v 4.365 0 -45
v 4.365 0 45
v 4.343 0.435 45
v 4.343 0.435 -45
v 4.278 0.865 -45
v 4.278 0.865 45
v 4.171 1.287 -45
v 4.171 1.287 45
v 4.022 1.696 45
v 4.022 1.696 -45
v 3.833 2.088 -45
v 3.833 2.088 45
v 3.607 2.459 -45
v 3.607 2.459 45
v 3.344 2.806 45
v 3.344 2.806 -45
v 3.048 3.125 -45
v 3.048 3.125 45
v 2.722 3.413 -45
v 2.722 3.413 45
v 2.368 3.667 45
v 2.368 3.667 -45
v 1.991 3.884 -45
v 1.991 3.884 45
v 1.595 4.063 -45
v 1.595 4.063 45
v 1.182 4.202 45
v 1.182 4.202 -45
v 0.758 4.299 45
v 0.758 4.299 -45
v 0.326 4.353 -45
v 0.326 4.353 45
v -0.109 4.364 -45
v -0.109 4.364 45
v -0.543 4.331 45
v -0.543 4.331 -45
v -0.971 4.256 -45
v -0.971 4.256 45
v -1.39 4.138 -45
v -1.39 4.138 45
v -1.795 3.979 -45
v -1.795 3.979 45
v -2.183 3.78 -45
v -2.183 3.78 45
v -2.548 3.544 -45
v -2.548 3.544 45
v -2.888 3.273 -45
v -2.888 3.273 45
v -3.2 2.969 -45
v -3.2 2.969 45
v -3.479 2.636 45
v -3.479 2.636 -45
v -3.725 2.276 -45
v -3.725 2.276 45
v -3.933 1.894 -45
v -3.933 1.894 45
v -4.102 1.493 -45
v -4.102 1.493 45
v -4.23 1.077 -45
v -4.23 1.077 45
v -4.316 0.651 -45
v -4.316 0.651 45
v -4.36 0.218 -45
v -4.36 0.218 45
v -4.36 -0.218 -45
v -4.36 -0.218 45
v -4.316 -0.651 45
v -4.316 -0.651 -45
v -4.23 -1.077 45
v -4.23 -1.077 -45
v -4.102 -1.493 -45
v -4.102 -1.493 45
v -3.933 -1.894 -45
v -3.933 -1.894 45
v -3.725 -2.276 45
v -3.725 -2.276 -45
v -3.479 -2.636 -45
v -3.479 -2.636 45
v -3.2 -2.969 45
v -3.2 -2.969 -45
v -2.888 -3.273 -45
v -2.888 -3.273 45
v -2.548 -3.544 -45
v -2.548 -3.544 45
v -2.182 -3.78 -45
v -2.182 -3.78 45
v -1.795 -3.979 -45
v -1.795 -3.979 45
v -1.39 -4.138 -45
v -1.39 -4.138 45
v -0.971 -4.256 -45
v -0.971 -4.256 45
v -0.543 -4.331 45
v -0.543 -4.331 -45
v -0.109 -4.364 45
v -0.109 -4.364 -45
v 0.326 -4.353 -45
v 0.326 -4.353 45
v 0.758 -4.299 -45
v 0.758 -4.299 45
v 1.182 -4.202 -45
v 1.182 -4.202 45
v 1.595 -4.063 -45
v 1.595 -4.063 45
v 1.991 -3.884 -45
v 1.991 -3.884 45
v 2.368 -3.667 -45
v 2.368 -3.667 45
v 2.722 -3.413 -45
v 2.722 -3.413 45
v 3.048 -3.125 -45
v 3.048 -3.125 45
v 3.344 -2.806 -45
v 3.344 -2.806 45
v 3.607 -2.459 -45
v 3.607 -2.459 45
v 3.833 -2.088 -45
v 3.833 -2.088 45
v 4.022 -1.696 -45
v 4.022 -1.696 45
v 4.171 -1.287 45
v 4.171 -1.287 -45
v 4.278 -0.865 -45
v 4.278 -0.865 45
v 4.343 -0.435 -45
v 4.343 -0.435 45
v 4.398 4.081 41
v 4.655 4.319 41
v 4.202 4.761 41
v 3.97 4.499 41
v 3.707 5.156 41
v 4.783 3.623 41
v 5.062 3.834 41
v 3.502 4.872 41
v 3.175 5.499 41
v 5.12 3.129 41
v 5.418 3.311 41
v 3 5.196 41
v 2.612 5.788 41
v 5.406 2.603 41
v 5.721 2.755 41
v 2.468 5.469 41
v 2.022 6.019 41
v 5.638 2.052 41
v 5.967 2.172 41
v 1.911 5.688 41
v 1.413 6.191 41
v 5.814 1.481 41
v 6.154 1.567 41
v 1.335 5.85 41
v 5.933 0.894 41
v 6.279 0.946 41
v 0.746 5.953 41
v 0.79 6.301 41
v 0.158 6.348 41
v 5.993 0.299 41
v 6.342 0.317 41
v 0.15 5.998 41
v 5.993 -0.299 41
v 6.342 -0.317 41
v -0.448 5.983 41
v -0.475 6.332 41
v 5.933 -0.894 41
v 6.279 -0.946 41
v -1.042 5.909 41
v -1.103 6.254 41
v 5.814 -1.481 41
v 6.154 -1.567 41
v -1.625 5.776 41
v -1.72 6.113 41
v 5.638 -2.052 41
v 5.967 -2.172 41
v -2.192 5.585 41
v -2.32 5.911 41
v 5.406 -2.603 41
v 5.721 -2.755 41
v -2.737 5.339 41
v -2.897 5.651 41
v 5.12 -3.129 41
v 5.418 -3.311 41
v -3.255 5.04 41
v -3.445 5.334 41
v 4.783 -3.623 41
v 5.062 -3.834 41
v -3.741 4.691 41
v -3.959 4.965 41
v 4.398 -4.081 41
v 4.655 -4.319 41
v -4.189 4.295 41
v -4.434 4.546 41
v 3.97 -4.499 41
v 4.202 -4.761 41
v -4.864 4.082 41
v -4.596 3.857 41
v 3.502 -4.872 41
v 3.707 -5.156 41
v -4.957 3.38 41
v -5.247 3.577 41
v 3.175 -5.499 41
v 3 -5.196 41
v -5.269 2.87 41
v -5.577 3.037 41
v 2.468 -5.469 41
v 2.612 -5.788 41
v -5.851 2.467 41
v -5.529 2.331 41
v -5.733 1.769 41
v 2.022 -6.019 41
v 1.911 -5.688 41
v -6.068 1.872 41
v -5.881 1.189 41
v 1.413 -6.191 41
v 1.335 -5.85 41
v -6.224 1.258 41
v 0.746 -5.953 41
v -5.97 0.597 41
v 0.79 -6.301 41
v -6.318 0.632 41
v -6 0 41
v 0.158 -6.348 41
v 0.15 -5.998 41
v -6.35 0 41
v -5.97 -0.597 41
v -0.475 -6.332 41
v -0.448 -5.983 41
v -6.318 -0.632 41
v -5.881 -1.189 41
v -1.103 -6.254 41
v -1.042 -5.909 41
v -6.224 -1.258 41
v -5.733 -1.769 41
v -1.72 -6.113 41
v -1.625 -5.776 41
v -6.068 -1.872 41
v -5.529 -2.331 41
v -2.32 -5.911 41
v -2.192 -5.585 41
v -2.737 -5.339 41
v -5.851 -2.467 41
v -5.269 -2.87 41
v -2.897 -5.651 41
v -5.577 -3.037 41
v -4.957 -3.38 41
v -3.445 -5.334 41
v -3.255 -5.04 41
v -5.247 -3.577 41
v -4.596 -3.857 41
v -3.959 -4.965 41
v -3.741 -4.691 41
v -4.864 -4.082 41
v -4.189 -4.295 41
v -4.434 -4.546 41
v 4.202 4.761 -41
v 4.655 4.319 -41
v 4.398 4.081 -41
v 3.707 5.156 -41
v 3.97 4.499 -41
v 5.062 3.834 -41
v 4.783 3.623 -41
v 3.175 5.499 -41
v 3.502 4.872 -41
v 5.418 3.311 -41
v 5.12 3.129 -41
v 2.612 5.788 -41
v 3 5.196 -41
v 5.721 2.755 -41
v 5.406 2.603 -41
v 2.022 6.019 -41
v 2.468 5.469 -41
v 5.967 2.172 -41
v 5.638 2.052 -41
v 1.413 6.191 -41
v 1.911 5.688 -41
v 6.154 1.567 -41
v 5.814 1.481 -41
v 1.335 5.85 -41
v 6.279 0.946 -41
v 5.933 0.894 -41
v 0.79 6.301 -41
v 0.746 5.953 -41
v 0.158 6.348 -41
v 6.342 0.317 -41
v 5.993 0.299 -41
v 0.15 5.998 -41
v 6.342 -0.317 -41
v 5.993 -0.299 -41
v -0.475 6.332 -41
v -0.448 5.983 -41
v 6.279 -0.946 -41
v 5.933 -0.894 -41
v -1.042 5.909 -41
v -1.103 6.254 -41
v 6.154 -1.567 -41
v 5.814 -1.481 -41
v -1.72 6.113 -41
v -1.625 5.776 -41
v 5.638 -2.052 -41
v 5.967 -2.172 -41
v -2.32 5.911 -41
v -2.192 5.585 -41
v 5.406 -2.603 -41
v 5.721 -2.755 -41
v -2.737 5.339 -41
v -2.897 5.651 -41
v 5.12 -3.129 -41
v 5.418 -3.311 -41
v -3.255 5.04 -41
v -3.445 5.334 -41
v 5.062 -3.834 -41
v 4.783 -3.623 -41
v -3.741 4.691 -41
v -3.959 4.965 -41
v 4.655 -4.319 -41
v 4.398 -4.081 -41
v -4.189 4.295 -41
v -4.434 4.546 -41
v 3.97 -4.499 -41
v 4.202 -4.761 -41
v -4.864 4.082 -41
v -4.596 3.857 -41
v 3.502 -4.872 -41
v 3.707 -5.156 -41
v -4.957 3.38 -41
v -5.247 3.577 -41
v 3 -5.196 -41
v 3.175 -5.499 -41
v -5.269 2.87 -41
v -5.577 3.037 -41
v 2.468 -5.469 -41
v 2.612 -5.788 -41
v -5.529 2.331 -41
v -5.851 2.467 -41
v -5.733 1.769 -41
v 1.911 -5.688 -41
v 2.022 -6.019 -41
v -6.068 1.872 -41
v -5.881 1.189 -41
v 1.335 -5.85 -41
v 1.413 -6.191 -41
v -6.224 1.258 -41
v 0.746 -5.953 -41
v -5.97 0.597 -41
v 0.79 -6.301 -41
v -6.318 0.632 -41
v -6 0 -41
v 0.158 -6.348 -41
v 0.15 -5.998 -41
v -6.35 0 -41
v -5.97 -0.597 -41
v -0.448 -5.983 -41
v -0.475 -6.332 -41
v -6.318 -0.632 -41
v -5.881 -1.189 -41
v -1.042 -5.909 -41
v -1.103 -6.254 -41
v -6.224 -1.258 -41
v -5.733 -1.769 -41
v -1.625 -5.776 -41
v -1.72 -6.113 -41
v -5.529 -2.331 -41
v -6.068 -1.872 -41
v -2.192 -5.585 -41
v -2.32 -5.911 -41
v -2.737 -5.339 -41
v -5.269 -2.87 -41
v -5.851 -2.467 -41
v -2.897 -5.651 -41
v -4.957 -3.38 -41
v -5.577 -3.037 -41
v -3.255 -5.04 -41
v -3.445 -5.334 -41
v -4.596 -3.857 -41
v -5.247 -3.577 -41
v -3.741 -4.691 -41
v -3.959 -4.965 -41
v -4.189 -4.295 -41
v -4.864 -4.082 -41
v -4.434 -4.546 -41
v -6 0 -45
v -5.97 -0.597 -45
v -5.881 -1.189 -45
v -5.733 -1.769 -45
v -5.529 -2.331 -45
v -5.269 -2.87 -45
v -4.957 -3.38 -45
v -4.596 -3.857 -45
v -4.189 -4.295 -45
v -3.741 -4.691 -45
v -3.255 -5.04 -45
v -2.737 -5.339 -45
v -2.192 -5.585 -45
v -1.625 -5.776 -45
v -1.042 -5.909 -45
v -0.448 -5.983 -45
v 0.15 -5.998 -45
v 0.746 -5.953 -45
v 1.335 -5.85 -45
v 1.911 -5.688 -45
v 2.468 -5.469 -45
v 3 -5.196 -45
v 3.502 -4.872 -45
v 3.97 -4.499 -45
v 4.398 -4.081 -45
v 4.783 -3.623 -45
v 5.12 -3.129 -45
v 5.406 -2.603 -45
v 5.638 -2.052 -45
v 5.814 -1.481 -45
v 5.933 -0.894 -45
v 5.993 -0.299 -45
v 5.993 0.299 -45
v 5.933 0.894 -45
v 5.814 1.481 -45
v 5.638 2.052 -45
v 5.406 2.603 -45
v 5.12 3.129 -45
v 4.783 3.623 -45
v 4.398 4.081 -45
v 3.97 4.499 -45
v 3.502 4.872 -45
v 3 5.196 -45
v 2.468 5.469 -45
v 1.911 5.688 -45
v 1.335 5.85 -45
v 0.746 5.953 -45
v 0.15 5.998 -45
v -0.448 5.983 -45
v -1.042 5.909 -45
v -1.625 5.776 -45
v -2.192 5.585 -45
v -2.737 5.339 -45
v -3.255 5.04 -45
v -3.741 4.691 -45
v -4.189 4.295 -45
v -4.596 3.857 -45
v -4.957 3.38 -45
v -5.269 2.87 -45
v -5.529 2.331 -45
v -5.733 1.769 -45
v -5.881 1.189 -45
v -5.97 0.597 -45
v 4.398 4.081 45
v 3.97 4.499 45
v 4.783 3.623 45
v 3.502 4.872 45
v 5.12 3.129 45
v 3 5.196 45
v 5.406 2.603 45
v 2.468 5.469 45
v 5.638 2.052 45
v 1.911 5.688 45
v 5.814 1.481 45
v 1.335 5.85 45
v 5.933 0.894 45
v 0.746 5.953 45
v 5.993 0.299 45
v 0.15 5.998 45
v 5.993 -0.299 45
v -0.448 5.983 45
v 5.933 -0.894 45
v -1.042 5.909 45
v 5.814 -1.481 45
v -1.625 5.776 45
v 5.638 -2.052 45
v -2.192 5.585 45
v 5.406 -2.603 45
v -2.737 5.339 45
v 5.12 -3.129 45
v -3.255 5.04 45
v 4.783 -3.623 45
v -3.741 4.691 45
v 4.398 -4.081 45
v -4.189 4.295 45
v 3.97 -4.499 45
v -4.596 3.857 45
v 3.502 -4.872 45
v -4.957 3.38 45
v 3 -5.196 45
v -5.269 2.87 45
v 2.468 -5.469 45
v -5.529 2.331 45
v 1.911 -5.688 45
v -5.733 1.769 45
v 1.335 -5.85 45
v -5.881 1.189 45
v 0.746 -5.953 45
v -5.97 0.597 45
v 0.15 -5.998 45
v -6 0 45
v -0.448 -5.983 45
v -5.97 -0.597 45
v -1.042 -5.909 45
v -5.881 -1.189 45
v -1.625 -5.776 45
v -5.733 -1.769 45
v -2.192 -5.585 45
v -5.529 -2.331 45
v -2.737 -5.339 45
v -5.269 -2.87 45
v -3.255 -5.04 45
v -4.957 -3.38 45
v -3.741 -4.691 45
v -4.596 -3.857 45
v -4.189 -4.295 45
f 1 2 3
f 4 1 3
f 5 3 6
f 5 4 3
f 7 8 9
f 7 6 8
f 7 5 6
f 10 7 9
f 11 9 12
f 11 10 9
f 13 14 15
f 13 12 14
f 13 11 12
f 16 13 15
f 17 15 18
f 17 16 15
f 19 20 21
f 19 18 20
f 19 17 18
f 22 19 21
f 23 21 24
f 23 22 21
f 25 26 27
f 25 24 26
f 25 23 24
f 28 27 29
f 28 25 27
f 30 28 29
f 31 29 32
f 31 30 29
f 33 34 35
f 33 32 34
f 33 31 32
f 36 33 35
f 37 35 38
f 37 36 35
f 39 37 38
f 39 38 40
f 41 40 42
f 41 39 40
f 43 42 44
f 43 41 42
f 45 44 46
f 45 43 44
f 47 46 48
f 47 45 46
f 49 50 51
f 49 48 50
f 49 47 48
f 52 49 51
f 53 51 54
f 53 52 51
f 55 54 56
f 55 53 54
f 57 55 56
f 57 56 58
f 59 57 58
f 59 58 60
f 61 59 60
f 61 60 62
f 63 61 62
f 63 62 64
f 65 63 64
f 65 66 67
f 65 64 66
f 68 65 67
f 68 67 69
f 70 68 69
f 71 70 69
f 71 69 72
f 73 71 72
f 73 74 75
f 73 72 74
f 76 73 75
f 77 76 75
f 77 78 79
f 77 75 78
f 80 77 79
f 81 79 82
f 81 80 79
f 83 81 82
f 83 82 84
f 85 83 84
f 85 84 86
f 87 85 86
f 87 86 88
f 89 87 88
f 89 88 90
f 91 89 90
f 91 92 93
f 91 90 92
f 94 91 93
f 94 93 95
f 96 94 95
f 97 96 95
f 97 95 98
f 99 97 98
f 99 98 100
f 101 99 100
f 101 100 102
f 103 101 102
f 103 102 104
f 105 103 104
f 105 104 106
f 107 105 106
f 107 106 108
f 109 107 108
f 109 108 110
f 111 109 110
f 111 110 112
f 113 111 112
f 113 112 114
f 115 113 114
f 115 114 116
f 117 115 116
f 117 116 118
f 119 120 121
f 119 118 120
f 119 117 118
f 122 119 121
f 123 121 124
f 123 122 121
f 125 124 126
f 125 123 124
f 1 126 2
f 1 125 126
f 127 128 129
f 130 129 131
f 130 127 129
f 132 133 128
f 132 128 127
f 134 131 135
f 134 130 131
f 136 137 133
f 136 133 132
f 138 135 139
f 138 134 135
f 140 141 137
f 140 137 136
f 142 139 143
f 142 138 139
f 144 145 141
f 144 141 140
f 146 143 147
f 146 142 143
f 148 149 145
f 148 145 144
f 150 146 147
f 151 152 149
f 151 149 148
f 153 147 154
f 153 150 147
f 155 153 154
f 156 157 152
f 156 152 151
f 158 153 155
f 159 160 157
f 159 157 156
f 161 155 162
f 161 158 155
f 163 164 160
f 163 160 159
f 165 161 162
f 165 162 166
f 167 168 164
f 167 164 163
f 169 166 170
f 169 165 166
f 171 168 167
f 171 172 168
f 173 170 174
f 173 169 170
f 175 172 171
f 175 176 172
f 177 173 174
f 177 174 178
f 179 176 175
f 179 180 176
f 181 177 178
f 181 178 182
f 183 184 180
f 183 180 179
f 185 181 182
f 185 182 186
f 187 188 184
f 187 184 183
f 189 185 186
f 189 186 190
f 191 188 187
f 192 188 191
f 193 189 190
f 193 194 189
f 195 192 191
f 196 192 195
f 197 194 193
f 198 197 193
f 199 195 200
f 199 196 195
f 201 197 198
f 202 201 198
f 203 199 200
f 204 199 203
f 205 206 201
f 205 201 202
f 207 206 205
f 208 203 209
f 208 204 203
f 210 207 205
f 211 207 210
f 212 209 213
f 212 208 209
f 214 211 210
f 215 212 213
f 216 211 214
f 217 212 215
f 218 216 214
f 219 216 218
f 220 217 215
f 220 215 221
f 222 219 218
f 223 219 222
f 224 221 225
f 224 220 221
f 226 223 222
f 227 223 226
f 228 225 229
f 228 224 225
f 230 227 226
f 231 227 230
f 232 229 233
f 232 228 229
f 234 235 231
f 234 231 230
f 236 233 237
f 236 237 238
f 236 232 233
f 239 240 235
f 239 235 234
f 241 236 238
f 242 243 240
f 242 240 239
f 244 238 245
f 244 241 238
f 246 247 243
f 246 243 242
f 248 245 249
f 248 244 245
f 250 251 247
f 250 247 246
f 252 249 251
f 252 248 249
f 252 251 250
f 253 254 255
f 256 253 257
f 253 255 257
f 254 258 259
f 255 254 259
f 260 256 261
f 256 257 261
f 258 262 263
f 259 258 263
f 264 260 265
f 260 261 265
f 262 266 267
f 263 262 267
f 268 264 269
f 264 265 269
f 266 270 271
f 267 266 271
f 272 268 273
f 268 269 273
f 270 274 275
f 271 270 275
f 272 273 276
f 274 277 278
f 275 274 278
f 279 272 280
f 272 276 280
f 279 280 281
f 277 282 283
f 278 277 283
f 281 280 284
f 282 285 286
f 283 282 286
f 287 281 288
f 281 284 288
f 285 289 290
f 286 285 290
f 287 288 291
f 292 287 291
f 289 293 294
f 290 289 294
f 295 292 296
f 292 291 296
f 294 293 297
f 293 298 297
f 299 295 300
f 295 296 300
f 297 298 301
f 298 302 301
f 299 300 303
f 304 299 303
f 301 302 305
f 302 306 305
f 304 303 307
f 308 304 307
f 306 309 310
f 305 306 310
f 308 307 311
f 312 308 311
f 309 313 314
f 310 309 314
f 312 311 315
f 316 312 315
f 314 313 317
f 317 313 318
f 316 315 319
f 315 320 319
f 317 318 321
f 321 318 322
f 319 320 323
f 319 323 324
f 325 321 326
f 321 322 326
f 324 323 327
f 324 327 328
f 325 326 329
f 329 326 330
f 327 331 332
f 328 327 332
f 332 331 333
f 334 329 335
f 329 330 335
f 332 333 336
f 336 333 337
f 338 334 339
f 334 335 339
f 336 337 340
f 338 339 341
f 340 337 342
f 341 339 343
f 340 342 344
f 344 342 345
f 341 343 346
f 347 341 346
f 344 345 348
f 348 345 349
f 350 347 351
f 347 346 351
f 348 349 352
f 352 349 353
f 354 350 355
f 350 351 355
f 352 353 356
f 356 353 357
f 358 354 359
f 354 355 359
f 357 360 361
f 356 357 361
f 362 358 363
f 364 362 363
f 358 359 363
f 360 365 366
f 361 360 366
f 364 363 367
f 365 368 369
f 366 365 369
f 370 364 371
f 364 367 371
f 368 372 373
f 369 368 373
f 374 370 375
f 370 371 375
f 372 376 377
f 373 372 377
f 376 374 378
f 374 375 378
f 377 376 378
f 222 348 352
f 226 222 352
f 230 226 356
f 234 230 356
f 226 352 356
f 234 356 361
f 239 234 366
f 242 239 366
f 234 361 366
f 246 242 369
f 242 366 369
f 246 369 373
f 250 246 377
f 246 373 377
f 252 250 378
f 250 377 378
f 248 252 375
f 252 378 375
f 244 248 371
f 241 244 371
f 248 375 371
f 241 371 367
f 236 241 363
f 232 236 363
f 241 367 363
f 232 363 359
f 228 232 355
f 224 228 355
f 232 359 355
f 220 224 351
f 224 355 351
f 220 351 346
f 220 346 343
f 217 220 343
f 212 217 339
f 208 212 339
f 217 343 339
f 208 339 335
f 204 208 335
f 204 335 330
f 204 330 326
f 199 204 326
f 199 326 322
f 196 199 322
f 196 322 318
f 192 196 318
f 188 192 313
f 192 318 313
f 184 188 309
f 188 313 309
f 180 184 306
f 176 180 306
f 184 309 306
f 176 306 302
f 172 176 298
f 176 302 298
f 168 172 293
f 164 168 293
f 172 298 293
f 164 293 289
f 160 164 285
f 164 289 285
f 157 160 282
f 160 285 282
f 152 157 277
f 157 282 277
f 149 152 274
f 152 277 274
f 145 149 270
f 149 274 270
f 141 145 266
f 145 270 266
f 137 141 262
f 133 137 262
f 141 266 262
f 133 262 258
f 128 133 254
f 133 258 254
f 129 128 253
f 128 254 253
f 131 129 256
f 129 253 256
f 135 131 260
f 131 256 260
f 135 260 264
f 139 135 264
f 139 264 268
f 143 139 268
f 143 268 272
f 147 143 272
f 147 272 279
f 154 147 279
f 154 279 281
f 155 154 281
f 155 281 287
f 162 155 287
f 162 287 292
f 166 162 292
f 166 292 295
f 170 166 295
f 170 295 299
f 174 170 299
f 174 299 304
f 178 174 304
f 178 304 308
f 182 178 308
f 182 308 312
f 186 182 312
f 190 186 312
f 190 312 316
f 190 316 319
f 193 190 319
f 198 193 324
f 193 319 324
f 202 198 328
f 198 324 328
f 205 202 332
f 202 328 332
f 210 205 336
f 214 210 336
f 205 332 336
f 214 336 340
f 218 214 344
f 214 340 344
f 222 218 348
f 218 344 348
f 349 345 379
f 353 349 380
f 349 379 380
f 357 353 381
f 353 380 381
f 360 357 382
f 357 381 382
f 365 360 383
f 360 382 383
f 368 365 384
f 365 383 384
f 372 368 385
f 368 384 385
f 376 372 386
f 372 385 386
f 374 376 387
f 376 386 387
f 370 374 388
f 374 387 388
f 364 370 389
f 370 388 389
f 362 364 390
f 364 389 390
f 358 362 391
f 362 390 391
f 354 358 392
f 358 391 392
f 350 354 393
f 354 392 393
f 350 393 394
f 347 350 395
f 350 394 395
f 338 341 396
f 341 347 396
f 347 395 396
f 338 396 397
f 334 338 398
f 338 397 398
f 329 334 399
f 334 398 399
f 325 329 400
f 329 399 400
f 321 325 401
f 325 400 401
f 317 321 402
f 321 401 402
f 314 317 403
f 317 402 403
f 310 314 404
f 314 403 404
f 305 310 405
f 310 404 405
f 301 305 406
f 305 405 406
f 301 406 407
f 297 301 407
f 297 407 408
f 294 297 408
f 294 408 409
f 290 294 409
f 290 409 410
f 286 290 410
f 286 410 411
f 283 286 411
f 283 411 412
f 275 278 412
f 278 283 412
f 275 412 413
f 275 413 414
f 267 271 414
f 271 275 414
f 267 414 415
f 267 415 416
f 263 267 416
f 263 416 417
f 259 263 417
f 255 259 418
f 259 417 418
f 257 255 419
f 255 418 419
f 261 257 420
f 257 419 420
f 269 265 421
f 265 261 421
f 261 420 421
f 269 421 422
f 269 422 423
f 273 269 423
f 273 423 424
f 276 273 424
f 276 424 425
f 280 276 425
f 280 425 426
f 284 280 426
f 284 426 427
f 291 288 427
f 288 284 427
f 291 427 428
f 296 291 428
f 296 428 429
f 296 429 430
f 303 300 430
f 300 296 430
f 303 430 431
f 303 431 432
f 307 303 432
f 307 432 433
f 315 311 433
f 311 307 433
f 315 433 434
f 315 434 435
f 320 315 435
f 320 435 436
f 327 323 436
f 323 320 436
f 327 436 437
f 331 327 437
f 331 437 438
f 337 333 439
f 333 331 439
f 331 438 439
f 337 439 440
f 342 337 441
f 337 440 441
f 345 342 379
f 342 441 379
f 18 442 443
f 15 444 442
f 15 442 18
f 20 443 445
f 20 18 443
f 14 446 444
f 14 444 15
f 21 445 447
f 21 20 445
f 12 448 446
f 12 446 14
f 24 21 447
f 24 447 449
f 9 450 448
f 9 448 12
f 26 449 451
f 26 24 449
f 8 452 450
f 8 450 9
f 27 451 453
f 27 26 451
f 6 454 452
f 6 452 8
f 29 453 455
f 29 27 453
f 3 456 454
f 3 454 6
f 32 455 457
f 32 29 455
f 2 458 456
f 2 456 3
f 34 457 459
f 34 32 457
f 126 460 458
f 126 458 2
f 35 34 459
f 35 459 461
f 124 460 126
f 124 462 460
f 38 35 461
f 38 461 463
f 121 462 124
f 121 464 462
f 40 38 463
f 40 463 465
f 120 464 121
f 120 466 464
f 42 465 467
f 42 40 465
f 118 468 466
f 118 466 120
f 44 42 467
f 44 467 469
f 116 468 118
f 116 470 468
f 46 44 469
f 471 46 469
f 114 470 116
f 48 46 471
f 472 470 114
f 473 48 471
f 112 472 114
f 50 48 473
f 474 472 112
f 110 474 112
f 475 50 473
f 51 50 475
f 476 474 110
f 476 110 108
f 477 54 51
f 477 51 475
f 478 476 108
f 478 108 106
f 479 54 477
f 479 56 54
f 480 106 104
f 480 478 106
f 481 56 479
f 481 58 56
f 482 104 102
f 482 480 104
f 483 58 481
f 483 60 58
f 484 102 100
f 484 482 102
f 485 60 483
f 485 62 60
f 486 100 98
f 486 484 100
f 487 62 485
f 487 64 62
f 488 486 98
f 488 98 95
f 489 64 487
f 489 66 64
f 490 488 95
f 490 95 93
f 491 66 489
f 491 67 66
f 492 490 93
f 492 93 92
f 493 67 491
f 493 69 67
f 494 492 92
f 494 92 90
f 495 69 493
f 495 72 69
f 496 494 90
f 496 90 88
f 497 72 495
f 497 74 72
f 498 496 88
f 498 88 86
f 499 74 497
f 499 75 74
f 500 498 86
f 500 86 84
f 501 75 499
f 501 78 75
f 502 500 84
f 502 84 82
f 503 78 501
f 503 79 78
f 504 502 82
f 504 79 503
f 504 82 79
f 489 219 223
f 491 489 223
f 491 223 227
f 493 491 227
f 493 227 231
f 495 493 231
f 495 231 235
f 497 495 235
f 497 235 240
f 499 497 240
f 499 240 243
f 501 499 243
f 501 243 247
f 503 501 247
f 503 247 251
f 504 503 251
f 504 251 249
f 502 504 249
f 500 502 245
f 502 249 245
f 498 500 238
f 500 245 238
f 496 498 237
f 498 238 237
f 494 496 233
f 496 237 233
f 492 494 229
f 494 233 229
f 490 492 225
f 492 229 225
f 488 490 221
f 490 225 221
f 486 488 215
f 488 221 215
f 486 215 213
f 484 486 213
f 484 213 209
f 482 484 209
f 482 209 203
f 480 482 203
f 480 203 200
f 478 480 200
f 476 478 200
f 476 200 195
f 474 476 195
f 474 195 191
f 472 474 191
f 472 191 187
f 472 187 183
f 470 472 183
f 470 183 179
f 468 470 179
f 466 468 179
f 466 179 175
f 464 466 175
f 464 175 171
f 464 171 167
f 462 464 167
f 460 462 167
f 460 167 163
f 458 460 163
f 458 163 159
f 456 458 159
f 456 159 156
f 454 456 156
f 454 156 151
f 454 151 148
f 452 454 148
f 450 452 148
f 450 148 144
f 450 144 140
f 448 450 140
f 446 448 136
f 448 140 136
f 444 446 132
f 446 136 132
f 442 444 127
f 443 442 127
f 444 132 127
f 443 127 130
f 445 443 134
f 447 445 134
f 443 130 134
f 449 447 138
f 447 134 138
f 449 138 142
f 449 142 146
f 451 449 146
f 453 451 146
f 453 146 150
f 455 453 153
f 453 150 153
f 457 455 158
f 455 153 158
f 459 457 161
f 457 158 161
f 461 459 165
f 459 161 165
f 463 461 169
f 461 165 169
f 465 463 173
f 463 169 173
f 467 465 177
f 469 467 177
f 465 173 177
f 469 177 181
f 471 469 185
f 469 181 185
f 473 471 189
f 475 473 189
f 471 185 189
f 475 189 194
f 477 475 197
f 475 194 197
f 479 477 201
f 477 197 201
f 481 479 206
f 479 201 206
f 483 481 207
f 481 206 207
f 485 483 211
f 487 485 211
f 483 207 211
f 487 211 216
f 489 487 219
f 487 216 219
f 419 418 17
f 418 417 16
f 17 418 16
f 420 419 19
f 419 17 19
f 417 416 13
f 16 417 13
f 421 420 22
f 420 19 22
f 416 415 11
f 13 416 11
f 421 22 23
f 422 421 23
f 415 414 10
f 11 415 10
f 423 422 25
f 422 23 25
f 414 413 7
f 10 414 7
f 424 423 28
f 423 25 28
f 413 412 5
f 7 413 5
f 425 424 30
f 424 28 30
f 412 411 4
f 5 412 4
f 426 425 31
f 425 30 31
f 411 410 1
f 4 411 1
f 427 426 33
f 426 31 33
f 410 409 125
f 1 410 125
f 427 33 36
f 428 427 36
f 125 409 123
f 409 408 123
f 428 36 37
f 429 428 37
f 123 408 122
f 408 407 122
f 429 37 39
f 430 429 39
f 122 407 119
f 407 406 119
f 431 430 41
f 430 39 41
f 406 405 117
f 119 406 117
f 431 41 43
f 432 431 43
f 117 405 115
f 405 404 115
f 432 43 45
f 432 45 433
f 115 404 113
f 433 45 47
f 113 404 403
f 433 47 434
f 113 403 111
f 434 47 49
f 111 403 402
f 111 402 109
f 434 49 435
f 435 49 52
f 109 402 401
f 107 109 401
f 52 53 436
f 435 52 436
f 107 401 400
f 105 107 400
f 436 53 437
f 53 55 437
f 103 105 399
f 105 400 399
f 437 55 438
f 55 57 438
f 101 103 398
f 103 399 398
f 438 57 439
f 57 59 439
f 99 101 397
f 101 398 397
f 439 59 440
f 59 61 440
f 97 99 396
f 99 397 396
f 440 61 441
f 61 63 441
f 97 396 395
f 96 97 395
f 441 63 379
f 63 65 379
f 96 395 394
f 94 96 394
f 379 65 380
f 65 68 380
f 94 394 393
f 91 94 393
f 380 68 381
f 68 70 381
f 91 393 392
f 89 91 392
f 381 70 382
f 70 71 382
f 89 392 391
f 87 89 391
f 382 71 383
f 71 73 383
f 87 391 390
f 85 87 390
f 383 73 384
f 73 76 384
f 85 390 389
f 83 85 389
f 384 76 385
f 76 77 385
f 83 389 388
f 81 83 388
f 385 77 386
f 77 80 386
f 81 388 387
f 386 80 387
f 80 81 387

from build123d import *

# Parameters (mm, degrees)
EXTRUDE1_DEPTH          = 45
EXTRUDE1_DEPTH_BACK     = 45
SKETCH1_R               = 6
EXTRUDE2_DEPTH          = 41
EXTRUDE2_DEPTH_BACK     = 41
SKETCH2_R               = 6.35
CUT_EXTRUDE1_DEPTH      = 46.887307613
CUT_EXTRUDE1_DEPTH_BACK = 46.887307613
SKETCH3_R               = 4.365


with BuildPart() as part:
    # Sketch1 → Extrude1 (new, two sides: drawn at the far end of the back side and taken through both)
    with BuildSketch(Plane.XY.offset(-EXTRUDE1_DEPTH_BACK)):
        with Locations(Location((0, 0, 0), (0, 0, 180))):
            Circle(SKETCH1_R)
    extrude(amount=EXTRUDE1_DEPTH + EXTRUDE1_DEPTH_BACK)

    # Sketch2 → Extrude2 (add, two sides: drawn at the far end of the back side and taken through both)
    with BuildSketch(Plane.XY.offset(-EXTRUDE2_DEPTH_BACK)):
        with Locations(Location((0, 0, 0), (0, 0, 180))):
            Circle(SKETCH2_R)
    extrude(amount=EXTRUDE2_DEPTH + EXTRUDE2_DEPTH_BACK)

    # Sketch3 → Cut-Extrude1 (cut, two sides: drawn at the far end of the back side and taken through both)
    with BuildSketch(Plane.XY.offset(-CUT_EXTRUDE1_DEPTH_BACK)):
        Circle(SKETCH3_R)
    extrude(amount=CUT_EXTRUDE1_DEPTH + CUT_EXTRUDE1_DEPTH_BACK, mode=Mode.SUBTRACT)


solid = part.part
